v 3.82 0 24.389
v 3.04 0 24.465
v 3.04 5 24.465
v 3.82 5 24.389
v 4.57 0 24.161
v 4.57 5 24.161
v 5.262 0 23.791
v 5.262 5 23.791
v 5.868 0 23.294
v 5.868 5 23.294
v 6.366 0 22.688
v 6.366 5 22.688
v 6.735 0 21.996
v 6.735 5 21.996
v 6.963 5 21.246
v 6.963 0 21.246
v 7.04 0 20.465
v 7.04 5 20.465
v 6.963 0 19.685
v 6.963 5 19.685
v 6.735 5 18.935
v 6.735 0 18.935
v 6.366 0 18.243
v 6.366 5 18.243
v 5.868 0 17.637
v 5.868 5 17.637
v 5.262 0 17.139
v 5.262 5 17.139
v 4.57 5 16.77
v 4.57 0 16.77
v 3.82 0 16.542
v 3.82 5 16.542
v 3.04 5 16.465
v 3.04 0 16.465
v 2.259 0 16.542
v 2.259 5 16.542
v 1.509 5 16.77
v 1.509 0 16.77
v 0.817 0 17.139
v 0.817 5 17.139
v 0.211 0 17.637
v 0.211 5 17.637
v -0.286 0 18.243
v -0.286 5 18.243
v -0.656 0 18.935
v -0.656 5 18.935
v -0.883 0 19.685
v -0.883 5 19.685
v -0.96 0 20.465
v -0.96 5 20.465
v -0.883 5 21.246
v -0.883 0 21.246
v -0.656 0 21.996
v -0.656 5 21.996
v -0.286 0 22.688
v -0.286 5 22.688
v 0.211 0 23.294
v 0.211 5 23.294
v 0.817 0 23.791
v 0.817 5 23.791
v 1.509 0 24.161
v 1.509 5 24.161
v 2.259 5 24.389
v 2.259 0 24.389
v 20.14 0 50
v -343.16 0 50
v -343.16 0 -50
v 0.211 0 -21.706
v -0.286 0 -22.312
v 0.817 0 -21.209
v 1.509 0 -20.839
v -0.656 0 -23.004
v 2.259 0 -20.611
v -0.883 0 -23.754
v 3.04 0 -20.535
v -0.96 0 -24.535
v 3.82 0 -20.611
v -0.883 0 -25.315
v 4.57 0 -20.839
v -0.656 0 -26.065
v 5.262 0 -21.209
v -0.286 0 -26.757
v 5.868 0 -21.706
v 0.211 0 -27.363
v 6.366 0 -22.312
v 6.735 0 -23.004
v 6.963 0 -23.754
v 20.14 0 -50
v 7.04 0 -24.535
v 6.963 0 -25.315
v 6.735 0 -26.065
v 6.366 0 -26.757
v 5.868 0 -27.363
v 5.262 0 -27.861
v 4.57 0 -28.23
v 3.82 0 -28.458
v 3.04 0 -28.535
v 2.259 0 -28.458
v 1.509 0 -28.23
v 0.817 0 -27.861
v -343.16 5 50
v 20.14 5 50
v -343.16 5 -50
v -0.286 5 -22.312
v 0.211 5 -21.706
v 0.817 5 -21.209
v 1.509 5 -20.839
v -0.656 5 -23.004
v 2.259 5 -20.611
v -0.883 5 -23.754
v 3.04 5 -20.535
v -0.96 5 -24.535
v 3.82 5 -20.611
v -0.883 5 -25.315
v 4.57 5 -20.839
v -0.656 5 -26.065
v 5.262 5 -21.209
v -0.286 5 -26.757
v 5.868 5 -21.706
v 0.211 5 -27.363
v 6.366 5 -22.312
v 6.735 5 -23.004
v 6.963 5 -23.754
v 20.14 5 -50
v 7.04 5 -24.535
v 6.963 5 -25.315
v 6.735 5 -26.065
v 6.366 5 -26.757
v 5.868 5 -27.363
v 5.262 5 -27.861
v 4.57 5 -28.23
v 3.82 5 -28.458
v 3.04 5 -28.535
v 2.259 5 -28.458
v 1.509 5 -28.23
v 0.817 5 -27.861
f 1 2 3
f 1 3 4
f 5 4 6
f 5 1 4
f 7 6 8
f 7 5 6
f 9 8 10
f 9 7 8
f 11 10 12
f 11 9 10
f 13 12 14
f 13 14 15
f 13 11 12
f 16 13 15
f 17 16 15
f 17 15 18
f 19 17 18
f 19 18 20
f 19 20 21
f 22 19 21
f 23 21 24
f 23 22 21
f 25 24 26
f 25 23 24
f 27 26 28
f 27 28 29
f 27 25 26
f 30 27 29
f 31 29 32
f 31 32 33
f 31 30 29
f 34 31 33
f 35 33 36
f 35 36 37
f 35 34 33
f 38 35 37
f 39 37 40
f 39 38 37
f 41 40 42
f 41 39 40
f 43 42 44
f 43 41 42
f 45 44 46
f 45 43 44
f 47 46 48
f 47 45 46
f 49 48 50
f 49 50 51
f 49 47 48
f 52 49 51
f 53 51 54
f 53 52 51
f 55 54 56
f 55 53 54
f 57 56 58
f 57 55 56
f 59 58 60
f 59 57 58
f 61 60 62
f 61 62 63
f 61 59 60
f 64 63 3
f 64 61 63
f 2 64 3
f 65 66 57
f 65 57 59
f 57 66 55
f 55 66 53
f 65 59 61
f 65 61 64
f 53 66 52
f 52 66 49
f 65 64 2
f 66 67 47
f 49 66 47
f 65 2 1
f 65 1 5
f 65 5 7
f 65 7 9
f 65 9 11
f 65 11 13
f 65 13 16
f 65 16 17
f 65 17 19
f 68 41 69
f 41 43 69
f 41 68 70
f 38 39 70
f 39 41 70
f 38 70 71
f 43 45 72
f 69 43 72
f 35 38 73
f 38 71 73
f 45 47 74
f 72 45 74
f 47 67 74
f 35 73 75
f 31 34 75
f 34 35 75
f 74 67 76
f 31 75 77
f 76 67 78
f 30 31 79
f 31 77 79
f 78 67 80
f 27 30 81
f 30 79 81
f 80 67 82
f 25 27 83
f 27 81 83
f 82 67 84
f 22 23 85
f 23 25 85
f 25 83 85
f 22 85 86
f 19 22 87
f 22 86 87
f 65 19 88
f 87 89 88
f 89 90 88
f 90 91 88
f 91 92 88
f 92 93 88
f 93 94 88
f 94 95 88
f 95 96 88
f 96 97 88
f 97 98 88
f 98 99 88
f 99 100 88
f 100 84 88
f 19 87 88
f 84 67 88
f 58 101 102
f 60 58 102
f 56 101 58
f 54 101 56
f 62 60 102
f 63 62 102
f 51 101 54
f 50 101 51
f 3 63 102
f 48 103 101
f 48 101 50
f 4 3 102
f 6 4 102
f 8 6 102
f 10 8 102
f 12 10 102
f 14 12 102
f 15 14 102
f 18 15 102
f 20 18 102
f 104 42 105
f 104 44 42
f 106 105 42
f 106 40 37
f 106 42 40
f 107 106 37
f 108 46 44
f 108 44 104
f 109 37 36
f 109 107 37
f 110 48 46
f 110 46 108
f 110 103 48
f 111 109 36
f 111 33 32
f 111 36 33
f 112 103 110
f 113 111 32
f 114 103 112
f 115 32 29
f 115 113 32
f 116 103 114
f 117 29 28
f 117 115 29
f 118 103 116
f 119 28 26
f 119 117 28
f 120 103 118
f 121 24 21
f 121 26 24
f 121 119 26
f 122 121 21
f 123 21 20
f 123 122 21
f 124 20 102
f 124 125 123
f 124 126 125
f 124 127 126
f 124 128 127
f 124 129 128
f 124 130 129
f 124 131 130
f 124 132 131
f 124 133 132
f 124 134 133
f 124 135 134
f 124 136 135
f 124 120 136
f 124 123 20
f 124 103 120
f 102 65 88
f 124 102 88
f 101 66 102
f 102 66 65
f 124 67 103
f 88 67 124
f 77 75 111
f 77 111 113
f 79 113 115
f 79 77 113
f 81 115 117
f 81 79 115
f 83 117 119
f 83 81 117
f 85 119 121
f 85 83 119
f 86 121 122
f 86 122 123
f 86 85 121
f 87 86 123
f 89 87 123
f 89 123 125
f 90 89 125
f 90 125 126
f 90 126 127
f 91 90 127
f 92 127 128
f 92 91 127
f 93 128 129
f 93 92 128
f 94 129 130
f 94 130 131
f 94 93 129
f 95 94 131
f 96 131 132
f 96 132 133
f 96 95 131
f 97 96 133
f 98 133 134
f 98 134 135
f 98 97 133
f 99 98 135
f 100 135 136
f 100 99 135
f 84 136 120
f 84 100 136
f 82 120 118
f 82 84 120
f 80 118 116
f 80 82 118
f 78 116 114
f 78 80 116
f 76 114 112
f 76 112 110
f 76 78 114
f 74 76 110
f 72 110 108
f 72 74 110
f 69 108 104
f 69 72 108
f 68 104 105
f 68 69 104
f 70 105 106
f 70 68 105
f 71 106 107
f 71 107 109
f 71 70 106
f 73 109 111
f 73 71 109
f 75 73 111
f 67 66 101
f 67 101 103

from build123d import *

# Parameters (mm, degrees)
ESBO_O1_W                = 363.3
ESBO_O1_H                = 100
ESBO_O1_R                = 4
RESSALTO_EXTRUS_O1_DEPTH = 5


with BuildPart() as part:
    # Esboço1 → Ressalto-extrusão1 (new body)
    with BuildSketch(Plane(origin=(0, 0, 0), x_dir=(1, 0, 0), z_dir=(0, 1, 0))):
        with Locations((-161.510348512, 0)):
            Rectangle(ESBO_O1_W, ESBO_O1_H)
        with Locations(Location((3.039651488, 24.534626046, 0), (0, 0, 270))):
            Circle(ESBO_O1_R, mode=Mode.SUBTRACT)
        with Locations(Location((3.039651488, -20.465373954, 0), (0, 0, 270))):
            Circle(ESBO_O1_R, mode=Mode.SUBTRACT)
    extrude(amount=RESSALTO_EXTRUS_O1_DEPTH)


solid = part.part
